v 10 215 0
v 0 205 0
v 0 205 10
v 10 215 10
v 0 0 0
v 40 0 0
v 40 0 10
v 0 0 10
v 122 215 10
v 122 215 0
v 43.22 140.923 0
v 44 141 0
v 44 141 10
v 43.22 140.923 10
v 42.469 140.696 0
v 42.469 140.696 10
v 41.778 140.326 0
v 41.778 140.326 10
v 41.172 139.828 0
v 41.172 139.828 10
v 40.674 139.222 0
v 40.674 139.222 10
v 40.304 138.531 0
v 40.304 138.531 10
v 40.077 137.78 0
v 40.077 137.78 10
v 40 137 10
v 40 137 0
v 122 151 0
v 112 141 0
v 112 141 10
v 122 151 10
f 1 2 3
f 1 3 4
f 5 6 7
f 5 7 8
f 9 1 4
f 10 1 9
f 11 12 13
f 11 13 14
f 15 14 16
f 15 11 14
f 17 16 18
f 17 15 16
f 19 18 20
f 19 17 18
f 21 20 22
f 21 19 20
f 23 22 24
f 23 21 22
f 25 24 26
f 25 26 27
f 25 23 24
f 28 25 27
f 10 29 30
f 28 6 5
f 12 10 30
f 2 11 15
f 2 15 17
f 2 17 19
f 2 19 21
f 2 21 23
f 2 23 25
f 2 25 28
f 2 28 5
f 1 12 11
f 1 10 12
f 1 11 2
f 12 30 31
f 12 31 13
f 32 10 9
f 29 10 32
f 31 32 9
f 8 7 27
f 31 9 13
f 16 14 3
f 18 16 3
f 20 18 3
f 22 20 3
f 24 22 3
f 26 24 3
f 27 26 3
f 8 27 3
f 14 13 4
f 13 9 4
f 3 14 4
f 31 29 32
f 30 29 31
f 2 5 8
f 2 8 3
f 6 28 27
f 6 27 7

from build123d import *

# Parameters (mm, degrees)
BOSS_EXTRUDE1_DEPTH = 10


with BuildPart() as part:
    # Sketch1 → Boss-Extrude1 (new body)
    with BuildSketch(Plane.XY):
        with BuildLine():
            Line((0, 0), (0, 205))
            Line((0, 205), (10, 215))
            Line((10, 215), (122, 215))
            Line((122, 215), (122, 151))
            Line((122, 151), (112, 141))
            Line((112, 141), (44, 141))
            ThreePointArc((44, 141), (41.171572875, 139.828427125), (40, 137))
            Line((40, 137), (40, 0))
            Line((40, 0), (0, 0))
        make_face()
    extrude(amount=BOSS_EXTRUDE1_DEPTH)


solid = part.part
